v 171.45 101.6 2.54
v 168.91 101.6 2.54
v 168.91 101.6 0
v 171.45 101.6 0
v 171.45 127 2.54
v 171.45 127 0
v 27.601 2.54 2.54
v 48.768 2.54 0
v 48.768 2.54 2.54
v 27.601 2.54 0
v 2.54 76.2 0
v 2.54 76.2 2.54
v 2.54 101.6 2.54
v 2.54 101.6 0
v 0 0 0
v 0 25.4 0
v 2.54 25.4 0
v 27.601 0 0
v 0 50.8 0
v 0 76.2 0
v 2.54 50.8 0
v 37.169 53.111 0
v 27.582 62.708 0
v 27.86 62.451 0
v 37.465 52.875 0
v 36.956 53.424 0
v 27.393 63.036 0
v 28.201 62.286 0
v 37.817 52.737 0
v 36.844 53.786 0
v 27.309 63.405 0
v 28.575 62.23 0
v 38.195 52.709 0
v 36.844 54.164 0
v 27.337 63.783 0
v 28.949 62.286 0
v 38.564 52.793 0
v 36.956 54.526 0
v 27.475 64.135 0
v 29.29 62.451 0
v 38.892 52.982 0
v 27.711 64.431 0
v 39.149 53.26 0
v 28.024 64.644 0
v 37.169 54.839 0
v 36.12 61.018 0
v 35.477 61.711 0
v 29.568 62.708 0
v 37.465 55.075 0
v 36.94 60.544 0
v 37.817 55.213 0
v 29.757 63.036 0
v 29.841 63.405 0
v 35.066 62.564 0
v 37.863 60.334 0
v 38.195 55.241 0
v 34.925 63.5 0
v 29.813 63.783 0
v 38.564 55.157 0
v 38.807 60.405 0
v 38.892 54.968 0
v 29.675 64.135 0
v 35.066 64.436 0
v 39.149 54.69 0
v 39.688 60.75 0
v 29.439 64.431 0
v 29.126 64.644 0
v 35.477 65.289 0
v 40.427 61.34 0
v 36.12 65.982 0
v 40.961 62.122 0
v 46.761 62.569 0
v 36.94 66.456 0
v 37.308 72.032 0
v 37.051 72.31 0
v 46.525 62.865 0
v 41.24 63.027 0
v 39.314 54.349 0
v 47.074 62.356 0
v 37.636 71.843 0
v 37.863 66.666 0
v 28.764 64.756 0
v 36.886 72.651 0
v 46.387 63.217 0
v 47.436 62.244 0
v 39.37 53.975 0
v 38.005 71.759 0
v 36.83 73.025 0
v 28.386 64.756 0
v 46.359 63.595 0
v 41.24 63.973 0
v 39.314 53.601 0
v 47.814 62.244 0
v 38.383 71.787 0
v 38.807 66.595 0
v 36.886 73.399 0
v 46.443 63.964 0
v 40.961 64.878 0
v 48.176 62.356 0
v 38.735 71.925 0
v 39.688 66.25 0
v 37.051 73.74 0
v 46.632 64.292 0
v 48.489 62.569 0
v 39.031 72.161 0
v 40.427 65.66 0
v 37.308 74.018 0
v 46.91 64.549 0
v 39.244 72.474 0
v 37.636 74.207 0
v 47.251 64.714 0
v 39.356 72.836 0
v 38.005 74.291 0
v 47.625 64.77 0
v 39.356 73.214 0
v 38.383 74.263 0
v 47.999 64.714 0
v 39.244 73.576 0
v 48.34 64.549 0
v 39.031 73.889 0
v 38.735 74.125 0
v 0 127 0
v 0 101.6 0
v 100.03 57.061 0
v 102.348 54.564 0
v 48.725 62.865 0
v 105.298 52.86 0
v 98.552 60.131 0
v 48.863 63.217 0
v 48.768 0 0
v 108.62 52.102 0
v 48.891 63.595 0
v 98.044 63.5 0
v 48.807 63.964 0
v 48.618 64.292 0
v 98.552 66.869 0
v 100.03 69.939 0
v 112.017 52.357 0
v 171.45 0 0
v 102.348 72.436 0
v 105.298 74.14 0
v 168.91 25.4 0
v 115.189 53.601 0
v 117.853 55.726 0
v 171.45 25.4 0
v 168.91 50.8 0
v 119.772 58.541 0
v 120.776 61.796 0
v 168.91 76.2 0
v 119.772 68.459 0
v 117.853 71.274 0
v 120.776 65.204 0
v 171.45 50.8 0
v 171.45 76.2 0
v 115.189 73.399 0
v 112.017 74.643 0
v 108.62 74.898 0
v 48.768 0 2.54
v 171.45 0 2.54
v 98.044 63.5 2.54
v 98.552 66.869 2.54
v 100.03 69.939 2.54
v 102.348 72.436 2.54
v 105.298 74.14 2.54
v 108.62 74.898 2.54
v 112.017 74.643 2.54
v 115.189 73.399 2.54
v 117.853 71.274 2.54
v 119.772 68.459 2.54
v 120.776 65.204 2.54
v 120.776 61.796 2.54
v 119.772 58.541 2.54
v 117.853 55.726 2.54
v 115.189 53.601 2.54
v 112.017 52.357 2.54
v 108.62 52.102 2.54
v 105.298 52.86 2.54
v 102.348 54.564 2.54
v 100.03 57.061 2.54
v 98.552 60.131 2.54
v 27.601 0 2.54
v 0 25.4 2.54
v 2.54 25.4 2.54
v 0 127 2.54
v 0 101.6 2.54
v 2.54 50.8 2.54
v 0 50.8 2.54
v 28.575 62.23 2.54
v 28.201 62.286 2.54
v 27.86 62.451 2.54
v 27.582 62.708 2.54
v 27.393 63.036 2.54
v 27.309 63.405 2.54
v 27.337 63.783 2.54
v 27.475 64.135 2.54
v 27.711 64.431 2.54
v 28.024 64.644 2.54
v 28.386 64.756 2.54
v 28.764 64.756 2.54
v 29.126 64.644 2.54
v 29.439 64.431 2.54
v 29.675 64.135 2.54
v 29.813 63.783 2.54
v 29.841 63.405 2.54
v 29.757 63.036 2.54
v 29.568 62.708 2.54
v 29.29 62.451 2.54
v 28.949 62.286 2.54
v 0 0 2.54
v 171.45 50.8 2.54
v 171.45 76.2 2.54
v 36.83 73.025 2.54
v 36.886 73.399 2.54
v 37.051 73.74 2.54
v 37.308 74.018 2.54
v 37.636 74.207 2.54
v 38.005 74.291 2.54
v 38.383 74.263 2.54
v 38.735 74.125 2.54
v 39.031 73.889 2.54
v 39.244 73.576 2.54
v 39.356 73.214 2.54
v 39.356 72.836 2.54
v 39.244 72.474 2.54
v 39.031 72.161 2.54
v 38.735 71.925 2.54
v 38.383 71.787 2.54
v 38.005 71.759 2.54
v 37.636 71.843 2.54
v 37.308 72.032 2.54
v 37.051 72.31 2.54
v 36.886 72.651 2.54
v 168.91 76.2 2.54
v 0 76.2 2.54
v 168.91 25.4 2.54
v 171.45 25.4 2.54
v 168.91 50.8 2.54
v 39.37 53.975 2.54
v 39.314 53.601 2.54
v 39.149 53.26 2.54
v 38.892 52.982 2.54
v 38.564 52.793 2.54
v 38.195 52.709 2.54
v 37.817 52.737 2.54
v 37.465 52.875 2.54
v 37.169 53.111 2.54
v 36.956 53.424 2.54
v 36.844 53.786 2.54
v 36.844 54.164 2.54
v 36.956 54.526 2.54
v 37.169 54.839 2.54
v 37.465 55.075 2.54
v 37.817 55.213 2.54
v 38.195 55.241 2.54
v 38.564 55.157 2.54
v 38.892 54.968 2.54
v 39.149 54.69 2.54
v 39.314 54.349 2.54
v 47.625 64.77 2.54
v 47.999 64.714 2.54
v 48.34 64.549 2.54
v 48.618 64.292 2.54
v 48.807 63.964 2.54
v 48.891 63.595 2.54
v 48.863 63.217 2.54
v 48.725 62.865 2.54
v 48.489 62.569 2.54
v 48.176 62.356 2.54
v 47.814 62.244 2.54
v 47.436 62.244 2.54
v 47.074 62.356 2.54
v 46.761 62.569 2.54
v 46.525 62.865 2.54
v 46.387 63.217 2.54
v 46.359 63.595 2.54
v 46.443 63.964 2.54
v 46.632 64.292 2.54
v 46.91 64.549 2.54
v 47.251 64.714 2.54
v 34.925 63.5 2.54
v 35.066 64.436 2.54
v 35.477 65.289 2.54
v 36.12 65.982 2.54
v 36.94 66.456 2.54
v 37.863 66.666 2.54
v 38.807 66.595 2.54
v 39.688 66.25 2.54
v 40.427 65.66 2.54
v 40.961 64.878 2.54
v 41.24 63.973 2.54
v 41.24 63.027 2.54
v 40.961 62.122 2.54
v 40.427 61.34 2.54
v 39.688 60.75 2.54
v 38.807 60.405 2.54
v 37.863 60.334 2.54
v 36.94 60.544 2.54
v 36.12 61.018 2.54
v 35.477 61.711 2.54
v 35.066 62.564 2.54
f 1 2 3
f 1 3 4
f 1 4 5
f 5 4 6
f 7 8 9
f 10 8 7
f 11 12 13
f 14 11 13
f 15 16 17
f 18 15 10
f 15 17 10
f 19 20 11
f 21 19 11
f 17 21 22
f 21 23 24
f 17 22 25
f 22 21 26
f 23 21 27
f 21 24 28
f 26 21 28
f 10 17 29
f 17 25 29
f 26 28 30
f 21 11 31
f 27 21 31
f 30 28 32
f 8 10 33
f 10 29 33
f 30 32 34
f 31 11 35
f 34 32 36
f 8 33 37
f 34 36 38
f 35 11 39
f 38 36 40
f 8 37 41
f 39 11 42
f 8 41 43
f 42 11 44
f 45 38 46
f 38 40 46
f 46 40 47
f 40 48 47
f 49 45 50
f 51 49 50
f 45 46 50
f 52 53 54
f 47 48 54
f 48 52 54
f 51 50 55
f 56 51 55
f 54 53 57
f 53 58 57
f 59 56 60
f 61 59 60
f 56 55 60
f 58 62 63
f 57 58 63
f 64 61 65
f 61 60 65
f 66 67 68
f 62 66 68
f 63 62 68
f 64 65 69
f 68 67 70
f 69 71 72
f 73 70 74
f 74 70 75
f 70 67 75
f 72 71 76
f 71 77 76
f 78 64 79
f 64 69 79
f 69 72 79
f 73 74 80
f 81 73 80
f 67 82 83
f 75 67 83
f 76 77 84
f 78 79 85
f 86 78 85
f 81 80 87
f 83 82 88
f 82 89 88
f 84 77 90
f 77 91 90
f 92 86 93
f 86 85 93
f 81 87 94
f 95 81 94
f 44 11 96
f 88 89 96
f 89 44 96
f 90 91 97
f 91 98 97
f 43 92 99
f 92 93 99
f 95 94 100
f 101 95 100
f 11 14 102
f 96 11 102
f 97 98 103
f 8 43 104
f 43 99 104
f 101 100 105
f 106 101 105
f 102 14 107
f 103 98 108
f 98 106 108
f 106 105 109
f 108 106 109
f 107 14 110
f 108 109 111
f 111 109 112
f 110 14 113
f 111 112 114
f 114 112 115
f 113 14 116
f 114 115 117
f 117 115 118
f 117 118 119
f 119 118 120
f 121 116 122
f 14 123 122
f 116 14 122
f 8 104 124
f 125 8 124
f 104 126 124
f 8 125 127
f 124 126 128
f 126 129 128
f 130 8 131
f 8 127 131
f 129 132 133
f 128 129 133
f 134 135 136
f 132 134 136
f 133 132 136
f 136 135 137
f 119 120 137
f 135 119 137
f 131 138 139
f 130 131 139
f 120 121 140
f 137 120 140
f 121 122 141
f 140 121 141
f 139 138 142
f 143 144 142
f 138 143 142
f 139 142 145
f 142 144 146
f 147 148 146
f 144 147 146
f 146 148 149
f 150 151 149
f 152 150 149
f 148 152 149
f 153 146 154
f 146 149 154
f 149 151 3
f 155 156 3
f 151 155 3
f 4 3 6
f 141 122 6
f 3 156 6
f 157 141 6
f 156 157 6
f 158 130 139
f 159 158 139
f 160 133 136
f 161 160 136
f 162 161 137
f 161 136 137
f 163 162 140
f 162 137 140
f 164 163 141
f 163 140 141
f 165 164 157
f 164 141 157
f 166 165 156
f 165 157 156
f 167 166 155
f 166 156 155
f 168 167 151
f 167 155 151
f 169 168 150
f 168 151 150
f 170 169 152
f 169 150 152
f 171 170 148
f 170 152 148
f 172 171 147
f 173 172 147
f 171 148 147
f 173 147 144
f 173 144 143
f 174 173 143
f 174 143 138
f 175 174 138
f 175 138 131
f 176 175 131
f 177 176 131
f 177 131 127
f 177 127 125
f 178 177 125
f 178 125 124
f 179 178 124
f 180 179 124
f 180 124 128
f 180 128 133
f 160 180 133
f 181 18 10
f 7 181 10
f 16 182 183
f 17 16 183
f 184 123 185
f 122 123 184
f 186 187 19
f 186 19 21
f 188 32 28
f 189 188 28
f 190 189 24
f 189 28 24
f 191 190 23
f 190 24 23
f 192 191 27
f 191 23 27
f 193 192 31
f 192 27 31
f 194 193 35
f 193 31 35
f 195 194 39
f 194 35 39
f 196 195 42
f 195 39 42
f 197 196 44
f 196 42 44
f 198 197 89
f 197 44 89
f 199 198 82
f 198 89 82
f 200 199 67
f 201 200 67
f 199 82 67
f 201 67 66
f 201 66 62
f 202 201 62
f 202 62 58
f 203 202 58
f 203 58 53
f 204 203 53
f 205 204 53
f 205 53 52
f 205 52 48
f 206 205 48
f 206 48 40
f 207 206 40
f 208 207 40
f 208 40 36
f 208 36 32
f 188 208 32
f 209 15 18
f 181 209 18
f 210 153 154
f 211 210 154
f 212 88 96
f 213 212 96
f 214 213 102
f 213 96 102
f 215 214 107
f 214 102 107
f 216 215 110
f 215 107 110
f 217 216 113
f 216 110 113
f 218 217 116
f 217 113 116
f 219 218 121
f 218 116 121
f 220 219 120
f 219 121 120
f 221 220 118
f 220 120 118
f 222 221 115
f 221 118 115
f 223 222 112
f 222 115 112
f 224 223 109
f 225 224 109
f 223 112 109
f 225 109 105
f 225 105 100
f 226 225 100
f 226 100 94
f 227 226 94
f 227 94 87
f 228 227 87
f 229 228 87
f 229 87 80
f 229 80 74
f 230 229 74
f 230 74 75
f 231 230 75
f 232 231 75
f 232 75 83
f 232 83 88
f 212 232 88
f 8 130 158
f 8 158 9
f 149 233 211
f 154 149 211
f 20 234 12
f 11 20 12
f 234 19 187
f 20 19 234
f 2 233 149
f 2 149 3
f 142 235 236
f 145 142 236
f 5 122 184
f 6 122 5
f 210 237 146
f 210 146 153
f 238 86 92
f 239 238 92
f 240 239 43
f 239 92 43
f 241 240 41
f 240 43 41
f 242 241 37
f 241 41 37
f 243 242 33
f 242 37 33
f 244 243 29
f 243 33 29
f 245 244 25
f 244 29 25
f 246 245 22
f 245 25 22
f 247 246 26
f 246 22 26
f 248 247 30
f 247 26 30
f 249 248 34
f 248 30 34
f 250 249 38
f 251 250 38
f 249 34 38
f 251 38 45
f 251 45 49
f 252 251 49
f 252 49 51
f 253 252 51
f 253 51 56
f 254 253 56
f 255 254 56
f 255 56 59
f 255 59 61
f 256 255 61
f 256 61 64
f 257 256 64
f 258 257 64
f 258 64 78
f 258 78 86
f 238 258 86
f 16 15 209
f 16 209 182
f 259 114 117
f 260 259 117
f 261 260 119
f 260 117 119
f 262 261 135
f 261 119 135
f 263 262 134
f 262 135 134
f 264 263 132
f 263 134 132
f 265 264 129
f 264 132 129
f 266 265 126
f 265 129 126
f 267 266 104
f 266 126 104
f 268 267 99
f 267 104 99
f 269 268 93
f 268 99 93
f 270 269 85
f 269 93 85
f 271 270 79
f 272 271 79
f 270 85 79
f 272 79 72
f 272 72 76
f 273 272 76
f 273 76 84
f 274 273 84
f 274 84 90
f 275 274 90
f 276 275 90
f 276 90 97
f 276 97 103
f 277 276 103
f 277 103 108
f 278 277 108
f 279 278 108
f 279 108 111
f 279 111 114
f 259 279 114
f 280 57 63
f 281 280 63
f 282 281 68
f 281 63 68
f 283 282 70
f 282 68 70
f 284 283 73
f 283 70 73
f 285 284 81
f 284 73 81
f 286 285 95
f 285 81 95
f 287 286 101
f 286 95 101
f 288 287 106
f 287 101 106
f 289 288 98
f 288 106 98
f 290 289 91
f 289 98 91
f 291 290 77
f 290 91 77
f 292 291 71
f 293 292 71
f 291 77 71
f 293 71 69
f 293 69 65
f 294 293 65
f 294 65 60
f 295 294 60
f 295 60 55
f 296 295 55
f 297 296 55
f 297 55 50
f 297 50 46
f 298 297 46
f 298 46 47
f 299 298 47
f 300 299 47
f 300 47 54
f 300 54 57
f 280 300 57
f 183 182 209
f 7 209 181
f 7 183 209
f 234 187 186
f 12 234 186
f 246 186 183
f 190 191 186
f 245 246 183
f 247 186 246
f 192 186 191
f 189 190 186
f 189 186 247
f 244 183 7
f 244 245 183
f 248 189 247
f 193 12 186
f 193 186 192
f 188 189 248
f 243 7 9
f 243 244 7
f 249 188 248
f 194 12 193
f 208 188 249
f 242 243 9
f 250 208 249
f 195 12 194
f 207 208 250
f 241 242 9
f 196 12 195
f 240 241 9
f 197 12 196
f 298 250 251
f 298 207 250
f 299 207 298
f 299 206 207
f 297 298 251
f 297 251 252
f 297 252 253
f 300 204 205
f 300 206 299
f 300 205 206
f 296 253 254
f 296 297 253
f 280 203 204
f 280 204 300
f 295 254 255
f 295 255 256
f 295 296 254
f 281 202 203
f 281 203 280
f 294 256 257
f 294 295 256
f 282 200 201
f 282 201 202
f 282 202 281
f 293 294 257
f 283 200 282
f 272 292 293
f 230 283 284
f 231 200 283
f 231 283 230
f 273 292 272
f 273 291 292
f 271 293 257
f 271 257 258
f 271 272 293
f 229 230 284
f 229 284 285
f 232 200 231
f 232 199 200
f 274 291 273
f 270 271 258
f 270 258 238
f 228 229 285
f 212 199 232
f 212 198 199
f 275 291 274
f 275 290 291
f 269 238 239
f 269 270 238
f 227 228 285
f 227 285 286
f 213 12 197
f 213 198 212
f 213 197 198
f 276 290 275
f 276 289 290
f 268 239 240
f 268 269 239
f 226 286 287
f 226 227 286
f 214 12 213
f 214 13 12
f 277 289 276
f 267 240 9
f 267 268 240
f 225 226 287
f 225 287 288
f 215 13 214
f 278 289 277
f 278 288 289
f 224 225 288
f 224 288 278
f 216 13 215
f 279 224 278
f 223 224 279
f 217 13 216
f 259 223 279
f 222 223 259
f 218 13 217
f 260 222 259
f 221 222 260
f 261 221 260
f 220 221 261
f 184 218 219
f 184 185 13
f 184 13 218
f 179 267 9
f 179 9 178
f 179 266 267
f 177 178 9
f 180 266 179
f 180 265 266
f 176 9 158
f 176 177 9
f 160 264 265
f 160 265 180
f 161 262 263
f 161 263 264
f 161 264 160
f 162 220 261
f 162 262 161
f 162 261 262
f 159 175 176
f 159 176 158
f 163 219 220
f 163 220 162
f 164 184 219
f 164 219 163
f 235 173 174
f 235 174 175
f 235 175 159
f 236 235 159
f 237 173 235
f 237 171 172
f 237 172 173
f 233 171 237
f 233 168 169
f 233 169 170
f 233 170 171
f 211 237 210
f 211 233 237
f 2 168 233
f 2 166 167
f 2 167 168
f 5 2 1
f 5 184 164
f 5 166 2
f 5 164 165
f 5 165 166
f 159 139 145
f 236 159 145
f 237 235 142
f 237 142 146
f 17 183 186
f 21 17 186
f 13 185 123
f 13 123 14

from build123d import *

# Parameters (mm, degrees)
SKETCH3_W           = 171.45
SKETCH3_H           = 127
BOSS_EXTRUDE1_DEPTH = 2.54
SKETCH4_W           = 2.54
SKETCH4_H           = 25.4
CUT_EXTRUDE1_DEPTH  = 3.54
LPATTERN1_COUNT     = 2
LPATTERN1_PITCH     = 50.8
SKETCH6_W           = 2.54
SKETCH6_H           = 25.4
CUT_EXTRUDE2_DEPTH  = 3.54
SKETCH7_W           = 2.54
SKETCH7_H           = 25.4
CUT_EXTRUDE3_DEPTH  = 3.54
SKETCH8_W           = 21.166666667
SKETCH8_H           = 2.54
CUT_EXTRUDE4_DEPTH  = 3.54
SKETCH9_R           = 11.43
CUT_EXTRUDE5_DEPTH  = 3.54
SKETCH10_R          = 3.175
CUT_EXTRUDE6_DEPTH  = 3.54
SKETCH11_R          = 1.27
CUT_EXTRUDE8_DEPTH  = 3.54
CIRPATTERN1_COUNT   = 4


with BuildPart() as part:
    # Sketch3 → Boss-Extrude1 (new body)
    with BuildSketch(Plane.XY):
        with Locations((85.725, 63.5)):
            Rectangle(SKETCH3_W, SKETCH3_H)
    extrude(amount=BOSS_EXTRUDE1_DEPTH)

    # Sketch4 → Cut-Extrude1 (cut, through all)
    with BuildSketch(Plane.XY.offset(2.54)):
        with Locations((1.27, 88.9)):
            Rectangle(SKETCH4_W, SKETCH4_H)
    cut_extrude1 = extrude(amount=-CUT_EXTRUDE1_DEPTH, mode=Mode.SUBTRACT)

    # LPattern1: Cut-Extrude1 ×2
    with Locations(*[(0, -i * LPATTERN1_PITCH, 0) for i in range(1, LPATTERN1_COUNT)]):
        add(cut_extrude1, mode=Mode.SUBTRACT)

    # Sketch6 → Cut-Extrude2 (cut, through all)
    with BuildSketch(Plane.XY.offset(2.54)):
        with Locations((170.18, 88.9)):
            Rectangle(SKETCH6_W, SKETCH6_H)
    extrude(amount=-CUT_EXTRUDE2_DEPTH, mode=Mode.SUBTRACT)

    # Sketch7 → Cut-Extrude3 (cut, through all)
    with BuildSketch(Plane.XY.offset(2.54)):
        with Locations((170.18, 38.1)):
            Rectangle(SKETCH7_W, SKETCH7_H)
    extrude(amount=-CUT_EXTRUDE3_DEPTH, mode=Mode.SUBTRACT)

    # Sketch8 → Cut-Extrude4 (cut, through all)
    with BuildSketch(Plane(origin=(0, 0, 0), x_dir=(-1, 0, 0), z_dir=(0, 0, -1))):
        with Locations((-38.184666667, 1.27)):
            Rectangle(SKETCH8_W, SKETCH8_H)
    extrude(amount=-CUT_EXTRUDE4_DEPTH, mode=Mode.SUBTRACT)

    # Sketch9 → Cut-Extrude5 (cut, through all)
    with BuildSketch(Plane(origin=(0, 0, 0), x_dir=(-1, 0, 0), z_dir=(0, 0, -1))):
        with Locations((-109.474, 63.5)):
            Circle(SKETCH9_R)
    extrude(amount=-CUT_EXTRUDE5_DEPTH, mode=Mode.SUBTRACT)

    # Sketch10 → Cut-Extrude6 (cut, through all)
    with BuildSketch(Plane(origin=(0, 0, 0), x_dir=(-1, 0, 0), z_dir=(0, 0, -1))):
        with Locations((-38.1, 63.5)):
            Circle(SKETCH10_R)
    extrude(amount=-CUT_EXTRUDE6_DEPTH, mode=Mode.SUBTRACT)

    # Sketch11 → Cut-Extrude8 (cut, through all)
    with BuildSketch(Plane(origin=(0, 0, 0), x_dir=(-1, 0, 0), z_dir=(0, 0, -1))):
        with Locations((-38.1, 73.025)):
            Circle(SKETCH11_R)
    cut_extrude8 = extrude(amount=-CUT_EXTRUDE8_DEPTH, mode=Mode.SUBTRACT)

    # CirPattern1: Cut-Extrude8 ×4 about axis
    cirpattern1_axis = Axis((38.1, 63.5, 0), (0, 0, 1))
    for i in range(1, CIRPATTERN1_COUNT):
        add(cut_extrude8.rotate(cirpattern1_axis, i * 360 / CIRPATTERN1_COUNT), mode=Mode.SUBTRACT)


solid = part.part
